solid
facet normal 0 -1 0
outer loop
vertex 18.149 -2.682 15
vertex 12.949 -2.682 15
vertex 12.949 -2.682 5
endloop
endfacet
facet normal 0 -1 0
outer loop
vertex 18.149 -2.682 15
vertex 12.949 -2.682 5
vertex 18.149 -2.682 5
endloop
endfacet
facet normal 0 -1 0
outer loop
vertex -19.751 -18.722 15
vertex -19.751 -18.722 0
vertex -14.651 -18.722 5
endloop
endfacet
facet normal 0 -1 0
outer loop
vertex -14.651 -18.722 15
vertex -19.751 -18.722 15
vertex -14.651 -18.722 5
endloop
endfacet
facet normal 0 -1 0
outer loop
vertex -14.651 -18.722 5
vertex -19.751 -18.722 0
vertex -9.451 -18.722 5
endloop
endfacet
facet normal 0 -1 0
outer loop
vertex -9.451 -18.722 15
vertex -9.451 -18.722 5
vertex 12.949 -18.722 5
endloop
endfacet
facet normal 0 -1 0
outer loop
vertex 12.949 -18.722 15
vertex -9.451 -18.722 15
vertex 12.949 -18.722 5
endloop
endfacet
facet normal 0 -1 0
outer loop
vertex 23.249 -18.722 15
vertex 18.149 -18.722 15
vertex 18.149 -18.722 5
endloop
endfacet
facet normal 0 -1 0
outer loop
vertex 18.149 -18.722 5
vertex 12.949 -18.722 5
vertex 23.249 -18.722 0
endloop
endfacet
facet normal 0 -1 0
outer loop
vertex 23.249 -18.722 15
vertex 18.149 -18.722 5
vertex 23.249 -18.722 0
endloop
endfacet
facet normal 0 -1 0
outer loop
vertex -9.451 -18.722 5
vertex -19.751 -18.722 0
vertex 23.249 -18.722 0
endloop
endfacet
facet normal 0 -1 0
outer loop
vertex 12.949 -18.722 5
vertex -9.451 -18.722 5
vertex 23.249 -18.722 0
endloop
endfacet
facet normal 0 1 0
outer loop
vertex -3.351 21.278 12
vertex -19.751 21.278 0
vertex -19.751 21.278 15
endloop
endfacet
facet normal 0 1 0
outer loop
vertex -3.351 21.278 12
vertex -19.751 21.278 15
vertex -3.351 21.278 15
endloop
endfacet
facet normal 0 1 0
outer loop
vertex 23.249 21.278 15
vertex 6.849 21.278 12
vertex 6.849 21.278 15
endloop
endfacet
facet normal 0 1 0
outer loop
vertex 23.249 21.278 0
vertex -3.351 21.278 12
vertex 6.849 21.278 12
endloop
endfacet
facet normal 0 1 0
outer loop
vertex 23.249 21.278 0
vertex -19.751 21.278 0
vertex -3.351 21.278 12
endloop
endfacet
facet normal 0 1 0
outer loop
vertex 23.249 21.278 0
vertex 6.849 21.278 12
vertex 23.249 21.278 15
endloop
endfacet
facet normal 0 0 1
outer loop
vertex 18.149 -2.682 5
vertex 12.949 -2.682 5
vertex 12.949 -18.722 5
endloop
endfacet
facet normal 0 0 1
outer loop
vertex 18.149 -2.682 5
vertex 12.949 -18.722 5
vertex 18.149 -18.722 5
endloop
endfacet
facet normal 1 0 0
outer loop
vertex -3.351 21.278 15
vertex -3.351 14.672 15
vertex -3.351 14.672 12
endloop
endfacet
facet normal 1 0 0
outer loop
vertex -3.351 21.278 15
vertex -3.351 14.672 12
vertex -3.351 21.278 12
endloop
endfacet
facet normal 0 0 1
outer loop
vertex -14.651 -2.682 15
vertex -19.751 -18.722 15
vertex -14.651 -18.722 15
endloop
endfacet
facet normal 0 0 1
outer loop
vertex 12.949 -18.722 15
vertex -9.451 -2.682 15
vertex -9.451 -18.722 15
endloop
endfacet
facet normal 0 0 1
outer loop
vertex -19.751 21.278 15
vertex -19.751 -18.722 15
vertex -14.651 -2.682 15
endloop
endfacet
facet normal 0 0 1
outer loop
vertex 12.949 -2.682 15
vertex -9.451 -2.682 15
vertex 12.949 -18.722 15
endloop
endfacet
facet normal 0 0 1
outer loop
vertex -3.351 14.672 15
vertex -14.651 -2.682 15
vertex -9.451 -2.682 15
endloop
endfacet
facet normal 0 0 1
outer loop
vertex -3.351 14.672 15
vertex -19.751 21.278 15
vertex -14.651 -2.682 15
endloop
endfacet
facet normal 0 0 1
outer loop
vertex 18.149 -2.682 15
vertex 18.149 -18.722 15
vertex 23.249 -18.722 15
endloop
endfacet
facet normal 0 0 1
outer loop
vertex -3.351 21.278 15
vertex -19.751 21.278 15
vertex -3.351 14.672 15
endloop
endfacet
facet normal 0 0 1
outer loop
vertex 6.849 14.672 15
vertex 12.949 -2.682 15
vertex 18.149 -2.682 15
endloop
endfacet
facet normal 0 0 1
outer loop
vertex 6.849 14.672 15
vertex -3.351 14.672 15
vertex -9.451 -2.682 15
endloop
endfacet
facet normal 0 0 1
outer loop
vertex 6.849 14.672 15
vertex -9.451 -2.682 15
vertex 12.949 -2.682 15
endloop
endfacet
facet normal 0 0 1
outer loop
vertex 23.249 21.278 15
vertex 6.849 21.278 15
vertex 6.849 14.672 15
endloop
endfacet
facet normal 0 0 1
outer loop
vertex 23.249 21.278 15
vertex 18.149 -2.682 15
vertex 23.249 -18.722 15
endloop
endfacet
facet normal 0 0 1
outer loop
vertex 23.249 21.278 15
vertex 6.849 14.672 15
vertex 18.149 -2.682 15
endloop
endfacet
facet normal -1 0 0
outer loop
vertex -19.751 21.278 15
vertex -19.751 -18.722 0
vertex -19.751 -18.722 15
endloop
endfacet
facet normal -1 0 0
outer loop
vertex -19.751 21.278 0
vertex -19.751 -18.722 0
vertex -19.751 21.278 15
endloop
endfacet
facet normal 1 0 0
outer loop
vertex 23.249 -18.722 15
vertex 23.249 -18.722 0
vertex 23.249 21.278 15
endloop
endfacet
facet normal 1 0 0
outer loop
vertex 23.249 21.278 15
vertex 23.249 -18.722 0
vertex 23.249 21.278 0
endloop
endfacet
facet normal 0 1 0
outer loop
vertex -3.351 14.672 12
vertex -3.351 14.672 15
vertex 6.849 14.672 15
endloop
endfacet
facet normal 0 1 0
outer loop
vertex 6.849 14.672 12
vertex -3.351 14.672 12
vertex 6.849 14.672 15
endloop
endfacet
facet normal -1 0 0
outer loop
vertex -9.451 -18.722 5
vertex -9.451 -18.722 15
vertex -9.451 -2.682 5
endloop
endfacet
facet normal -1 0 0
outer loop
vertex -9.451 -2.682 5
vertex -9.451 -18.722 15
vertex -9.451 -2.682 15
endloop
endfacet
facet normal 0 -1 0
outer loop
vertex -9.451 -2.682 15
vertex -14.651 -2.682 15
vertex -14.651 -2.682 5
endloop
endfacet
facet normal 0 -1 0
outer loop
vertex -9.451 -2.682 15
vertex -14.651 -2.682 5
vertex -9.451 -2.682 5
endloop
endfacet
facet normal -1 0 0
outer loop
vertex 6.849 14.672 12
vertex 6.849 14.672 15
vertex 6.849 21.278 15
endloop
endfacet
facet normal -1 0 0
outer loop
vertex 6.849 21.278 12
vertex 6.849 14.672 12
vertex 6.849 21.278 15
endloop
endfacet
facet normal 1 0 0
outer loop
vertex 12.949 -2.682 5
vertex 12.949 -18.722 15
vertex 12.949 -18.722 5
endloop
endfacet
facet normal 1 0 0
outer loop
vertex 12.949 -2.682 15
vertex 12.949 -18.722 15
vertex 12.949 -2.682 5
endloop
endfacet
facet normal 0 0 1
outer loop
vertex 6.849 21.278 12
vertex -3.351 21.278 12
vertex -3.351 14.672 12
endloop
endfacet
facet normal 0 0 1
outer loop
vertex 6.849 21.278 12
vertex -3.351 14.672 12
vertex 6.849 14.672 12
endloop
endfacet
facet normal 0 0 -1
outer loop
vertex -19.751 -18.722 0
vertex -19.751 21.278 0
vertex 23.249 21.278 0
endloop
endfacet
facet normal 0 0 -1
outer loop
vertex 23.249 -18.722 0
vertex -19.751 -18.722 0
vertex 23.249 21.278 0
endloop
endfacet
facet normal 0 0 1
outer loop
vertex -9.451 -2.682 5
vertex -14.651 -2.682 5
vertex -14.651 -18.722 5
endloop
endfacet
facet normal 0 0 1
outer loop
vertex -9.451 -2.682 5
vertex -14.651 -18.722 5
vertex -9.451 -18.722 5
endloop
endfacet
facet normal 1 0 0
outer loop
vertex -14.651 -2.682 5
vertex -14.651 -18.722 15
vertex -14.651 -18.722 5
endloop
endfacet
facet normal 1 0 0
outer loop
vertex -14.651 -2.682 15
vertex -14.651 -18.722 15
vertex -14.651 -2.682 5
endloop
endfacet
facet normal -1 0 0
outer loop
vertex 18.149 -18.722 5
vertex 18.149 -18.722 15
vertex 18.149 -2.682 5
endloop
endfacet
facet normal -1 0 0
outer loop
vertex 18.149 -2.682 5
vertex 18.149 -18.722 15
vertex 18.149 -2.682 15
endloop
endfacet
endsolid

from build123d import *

# Parameters (mm, degrees)
SKETCH1_W           = 43
SKETCH1_H           = 40
BOSS_EXTRUDE1_DEPTH = 15
SKETCH3_W           = 10.2
SKETCH3_H           = 6.605333129
CUT_EXTRUDE1_DEPTH  = 3
SKETCH3_4_W         = 5.2
SKETCH3_4_H         = 16.040940276
CUT_EXTRUDE2_DEPTH  = 10


with BuildPart() as part:
    # Sketch1 → Boss-Extrude1 (new body)
    with BuildSketch(Plane.XY):
        with Locations((1.748803828, 1.277511962)):
            Rectangle(SKETCH1_W, SKETCH1_H)
    extrude(amount=BOSS_EXTRUDE1_DEPTH)

    # Sketch3 → Cut-Extrude1 (cut)
    with BuildSketch(Plane.XY.offset(15)):
        with Locations((1.748803828, 17.974845398)):
            Rectangle(SKETCH3_W, SKETCH3_H)
    extrude(amount=-CUT_EXTRUDE1_DEPTH, mode=Mode.SUBTRACT)

    # Sketch3<4> → Cut-Extrude2 (cut)
    with BuildSketch(Plane.XY.offset(15)):
        with Locations((-12.051196172, -10.7020179)):
            Rectangle(SKETCH3_4_W, SKETCH3_4_H)
        with Locations((15.548803828, -10.7020179)):
            Rectangle(SKETCH3_4_W, SKETCH3_4_H)
    extrude(amount=-CUT_EXTRUDE2_DEPTH, mode=Mode.SUBTRACT)


solid = part.part
